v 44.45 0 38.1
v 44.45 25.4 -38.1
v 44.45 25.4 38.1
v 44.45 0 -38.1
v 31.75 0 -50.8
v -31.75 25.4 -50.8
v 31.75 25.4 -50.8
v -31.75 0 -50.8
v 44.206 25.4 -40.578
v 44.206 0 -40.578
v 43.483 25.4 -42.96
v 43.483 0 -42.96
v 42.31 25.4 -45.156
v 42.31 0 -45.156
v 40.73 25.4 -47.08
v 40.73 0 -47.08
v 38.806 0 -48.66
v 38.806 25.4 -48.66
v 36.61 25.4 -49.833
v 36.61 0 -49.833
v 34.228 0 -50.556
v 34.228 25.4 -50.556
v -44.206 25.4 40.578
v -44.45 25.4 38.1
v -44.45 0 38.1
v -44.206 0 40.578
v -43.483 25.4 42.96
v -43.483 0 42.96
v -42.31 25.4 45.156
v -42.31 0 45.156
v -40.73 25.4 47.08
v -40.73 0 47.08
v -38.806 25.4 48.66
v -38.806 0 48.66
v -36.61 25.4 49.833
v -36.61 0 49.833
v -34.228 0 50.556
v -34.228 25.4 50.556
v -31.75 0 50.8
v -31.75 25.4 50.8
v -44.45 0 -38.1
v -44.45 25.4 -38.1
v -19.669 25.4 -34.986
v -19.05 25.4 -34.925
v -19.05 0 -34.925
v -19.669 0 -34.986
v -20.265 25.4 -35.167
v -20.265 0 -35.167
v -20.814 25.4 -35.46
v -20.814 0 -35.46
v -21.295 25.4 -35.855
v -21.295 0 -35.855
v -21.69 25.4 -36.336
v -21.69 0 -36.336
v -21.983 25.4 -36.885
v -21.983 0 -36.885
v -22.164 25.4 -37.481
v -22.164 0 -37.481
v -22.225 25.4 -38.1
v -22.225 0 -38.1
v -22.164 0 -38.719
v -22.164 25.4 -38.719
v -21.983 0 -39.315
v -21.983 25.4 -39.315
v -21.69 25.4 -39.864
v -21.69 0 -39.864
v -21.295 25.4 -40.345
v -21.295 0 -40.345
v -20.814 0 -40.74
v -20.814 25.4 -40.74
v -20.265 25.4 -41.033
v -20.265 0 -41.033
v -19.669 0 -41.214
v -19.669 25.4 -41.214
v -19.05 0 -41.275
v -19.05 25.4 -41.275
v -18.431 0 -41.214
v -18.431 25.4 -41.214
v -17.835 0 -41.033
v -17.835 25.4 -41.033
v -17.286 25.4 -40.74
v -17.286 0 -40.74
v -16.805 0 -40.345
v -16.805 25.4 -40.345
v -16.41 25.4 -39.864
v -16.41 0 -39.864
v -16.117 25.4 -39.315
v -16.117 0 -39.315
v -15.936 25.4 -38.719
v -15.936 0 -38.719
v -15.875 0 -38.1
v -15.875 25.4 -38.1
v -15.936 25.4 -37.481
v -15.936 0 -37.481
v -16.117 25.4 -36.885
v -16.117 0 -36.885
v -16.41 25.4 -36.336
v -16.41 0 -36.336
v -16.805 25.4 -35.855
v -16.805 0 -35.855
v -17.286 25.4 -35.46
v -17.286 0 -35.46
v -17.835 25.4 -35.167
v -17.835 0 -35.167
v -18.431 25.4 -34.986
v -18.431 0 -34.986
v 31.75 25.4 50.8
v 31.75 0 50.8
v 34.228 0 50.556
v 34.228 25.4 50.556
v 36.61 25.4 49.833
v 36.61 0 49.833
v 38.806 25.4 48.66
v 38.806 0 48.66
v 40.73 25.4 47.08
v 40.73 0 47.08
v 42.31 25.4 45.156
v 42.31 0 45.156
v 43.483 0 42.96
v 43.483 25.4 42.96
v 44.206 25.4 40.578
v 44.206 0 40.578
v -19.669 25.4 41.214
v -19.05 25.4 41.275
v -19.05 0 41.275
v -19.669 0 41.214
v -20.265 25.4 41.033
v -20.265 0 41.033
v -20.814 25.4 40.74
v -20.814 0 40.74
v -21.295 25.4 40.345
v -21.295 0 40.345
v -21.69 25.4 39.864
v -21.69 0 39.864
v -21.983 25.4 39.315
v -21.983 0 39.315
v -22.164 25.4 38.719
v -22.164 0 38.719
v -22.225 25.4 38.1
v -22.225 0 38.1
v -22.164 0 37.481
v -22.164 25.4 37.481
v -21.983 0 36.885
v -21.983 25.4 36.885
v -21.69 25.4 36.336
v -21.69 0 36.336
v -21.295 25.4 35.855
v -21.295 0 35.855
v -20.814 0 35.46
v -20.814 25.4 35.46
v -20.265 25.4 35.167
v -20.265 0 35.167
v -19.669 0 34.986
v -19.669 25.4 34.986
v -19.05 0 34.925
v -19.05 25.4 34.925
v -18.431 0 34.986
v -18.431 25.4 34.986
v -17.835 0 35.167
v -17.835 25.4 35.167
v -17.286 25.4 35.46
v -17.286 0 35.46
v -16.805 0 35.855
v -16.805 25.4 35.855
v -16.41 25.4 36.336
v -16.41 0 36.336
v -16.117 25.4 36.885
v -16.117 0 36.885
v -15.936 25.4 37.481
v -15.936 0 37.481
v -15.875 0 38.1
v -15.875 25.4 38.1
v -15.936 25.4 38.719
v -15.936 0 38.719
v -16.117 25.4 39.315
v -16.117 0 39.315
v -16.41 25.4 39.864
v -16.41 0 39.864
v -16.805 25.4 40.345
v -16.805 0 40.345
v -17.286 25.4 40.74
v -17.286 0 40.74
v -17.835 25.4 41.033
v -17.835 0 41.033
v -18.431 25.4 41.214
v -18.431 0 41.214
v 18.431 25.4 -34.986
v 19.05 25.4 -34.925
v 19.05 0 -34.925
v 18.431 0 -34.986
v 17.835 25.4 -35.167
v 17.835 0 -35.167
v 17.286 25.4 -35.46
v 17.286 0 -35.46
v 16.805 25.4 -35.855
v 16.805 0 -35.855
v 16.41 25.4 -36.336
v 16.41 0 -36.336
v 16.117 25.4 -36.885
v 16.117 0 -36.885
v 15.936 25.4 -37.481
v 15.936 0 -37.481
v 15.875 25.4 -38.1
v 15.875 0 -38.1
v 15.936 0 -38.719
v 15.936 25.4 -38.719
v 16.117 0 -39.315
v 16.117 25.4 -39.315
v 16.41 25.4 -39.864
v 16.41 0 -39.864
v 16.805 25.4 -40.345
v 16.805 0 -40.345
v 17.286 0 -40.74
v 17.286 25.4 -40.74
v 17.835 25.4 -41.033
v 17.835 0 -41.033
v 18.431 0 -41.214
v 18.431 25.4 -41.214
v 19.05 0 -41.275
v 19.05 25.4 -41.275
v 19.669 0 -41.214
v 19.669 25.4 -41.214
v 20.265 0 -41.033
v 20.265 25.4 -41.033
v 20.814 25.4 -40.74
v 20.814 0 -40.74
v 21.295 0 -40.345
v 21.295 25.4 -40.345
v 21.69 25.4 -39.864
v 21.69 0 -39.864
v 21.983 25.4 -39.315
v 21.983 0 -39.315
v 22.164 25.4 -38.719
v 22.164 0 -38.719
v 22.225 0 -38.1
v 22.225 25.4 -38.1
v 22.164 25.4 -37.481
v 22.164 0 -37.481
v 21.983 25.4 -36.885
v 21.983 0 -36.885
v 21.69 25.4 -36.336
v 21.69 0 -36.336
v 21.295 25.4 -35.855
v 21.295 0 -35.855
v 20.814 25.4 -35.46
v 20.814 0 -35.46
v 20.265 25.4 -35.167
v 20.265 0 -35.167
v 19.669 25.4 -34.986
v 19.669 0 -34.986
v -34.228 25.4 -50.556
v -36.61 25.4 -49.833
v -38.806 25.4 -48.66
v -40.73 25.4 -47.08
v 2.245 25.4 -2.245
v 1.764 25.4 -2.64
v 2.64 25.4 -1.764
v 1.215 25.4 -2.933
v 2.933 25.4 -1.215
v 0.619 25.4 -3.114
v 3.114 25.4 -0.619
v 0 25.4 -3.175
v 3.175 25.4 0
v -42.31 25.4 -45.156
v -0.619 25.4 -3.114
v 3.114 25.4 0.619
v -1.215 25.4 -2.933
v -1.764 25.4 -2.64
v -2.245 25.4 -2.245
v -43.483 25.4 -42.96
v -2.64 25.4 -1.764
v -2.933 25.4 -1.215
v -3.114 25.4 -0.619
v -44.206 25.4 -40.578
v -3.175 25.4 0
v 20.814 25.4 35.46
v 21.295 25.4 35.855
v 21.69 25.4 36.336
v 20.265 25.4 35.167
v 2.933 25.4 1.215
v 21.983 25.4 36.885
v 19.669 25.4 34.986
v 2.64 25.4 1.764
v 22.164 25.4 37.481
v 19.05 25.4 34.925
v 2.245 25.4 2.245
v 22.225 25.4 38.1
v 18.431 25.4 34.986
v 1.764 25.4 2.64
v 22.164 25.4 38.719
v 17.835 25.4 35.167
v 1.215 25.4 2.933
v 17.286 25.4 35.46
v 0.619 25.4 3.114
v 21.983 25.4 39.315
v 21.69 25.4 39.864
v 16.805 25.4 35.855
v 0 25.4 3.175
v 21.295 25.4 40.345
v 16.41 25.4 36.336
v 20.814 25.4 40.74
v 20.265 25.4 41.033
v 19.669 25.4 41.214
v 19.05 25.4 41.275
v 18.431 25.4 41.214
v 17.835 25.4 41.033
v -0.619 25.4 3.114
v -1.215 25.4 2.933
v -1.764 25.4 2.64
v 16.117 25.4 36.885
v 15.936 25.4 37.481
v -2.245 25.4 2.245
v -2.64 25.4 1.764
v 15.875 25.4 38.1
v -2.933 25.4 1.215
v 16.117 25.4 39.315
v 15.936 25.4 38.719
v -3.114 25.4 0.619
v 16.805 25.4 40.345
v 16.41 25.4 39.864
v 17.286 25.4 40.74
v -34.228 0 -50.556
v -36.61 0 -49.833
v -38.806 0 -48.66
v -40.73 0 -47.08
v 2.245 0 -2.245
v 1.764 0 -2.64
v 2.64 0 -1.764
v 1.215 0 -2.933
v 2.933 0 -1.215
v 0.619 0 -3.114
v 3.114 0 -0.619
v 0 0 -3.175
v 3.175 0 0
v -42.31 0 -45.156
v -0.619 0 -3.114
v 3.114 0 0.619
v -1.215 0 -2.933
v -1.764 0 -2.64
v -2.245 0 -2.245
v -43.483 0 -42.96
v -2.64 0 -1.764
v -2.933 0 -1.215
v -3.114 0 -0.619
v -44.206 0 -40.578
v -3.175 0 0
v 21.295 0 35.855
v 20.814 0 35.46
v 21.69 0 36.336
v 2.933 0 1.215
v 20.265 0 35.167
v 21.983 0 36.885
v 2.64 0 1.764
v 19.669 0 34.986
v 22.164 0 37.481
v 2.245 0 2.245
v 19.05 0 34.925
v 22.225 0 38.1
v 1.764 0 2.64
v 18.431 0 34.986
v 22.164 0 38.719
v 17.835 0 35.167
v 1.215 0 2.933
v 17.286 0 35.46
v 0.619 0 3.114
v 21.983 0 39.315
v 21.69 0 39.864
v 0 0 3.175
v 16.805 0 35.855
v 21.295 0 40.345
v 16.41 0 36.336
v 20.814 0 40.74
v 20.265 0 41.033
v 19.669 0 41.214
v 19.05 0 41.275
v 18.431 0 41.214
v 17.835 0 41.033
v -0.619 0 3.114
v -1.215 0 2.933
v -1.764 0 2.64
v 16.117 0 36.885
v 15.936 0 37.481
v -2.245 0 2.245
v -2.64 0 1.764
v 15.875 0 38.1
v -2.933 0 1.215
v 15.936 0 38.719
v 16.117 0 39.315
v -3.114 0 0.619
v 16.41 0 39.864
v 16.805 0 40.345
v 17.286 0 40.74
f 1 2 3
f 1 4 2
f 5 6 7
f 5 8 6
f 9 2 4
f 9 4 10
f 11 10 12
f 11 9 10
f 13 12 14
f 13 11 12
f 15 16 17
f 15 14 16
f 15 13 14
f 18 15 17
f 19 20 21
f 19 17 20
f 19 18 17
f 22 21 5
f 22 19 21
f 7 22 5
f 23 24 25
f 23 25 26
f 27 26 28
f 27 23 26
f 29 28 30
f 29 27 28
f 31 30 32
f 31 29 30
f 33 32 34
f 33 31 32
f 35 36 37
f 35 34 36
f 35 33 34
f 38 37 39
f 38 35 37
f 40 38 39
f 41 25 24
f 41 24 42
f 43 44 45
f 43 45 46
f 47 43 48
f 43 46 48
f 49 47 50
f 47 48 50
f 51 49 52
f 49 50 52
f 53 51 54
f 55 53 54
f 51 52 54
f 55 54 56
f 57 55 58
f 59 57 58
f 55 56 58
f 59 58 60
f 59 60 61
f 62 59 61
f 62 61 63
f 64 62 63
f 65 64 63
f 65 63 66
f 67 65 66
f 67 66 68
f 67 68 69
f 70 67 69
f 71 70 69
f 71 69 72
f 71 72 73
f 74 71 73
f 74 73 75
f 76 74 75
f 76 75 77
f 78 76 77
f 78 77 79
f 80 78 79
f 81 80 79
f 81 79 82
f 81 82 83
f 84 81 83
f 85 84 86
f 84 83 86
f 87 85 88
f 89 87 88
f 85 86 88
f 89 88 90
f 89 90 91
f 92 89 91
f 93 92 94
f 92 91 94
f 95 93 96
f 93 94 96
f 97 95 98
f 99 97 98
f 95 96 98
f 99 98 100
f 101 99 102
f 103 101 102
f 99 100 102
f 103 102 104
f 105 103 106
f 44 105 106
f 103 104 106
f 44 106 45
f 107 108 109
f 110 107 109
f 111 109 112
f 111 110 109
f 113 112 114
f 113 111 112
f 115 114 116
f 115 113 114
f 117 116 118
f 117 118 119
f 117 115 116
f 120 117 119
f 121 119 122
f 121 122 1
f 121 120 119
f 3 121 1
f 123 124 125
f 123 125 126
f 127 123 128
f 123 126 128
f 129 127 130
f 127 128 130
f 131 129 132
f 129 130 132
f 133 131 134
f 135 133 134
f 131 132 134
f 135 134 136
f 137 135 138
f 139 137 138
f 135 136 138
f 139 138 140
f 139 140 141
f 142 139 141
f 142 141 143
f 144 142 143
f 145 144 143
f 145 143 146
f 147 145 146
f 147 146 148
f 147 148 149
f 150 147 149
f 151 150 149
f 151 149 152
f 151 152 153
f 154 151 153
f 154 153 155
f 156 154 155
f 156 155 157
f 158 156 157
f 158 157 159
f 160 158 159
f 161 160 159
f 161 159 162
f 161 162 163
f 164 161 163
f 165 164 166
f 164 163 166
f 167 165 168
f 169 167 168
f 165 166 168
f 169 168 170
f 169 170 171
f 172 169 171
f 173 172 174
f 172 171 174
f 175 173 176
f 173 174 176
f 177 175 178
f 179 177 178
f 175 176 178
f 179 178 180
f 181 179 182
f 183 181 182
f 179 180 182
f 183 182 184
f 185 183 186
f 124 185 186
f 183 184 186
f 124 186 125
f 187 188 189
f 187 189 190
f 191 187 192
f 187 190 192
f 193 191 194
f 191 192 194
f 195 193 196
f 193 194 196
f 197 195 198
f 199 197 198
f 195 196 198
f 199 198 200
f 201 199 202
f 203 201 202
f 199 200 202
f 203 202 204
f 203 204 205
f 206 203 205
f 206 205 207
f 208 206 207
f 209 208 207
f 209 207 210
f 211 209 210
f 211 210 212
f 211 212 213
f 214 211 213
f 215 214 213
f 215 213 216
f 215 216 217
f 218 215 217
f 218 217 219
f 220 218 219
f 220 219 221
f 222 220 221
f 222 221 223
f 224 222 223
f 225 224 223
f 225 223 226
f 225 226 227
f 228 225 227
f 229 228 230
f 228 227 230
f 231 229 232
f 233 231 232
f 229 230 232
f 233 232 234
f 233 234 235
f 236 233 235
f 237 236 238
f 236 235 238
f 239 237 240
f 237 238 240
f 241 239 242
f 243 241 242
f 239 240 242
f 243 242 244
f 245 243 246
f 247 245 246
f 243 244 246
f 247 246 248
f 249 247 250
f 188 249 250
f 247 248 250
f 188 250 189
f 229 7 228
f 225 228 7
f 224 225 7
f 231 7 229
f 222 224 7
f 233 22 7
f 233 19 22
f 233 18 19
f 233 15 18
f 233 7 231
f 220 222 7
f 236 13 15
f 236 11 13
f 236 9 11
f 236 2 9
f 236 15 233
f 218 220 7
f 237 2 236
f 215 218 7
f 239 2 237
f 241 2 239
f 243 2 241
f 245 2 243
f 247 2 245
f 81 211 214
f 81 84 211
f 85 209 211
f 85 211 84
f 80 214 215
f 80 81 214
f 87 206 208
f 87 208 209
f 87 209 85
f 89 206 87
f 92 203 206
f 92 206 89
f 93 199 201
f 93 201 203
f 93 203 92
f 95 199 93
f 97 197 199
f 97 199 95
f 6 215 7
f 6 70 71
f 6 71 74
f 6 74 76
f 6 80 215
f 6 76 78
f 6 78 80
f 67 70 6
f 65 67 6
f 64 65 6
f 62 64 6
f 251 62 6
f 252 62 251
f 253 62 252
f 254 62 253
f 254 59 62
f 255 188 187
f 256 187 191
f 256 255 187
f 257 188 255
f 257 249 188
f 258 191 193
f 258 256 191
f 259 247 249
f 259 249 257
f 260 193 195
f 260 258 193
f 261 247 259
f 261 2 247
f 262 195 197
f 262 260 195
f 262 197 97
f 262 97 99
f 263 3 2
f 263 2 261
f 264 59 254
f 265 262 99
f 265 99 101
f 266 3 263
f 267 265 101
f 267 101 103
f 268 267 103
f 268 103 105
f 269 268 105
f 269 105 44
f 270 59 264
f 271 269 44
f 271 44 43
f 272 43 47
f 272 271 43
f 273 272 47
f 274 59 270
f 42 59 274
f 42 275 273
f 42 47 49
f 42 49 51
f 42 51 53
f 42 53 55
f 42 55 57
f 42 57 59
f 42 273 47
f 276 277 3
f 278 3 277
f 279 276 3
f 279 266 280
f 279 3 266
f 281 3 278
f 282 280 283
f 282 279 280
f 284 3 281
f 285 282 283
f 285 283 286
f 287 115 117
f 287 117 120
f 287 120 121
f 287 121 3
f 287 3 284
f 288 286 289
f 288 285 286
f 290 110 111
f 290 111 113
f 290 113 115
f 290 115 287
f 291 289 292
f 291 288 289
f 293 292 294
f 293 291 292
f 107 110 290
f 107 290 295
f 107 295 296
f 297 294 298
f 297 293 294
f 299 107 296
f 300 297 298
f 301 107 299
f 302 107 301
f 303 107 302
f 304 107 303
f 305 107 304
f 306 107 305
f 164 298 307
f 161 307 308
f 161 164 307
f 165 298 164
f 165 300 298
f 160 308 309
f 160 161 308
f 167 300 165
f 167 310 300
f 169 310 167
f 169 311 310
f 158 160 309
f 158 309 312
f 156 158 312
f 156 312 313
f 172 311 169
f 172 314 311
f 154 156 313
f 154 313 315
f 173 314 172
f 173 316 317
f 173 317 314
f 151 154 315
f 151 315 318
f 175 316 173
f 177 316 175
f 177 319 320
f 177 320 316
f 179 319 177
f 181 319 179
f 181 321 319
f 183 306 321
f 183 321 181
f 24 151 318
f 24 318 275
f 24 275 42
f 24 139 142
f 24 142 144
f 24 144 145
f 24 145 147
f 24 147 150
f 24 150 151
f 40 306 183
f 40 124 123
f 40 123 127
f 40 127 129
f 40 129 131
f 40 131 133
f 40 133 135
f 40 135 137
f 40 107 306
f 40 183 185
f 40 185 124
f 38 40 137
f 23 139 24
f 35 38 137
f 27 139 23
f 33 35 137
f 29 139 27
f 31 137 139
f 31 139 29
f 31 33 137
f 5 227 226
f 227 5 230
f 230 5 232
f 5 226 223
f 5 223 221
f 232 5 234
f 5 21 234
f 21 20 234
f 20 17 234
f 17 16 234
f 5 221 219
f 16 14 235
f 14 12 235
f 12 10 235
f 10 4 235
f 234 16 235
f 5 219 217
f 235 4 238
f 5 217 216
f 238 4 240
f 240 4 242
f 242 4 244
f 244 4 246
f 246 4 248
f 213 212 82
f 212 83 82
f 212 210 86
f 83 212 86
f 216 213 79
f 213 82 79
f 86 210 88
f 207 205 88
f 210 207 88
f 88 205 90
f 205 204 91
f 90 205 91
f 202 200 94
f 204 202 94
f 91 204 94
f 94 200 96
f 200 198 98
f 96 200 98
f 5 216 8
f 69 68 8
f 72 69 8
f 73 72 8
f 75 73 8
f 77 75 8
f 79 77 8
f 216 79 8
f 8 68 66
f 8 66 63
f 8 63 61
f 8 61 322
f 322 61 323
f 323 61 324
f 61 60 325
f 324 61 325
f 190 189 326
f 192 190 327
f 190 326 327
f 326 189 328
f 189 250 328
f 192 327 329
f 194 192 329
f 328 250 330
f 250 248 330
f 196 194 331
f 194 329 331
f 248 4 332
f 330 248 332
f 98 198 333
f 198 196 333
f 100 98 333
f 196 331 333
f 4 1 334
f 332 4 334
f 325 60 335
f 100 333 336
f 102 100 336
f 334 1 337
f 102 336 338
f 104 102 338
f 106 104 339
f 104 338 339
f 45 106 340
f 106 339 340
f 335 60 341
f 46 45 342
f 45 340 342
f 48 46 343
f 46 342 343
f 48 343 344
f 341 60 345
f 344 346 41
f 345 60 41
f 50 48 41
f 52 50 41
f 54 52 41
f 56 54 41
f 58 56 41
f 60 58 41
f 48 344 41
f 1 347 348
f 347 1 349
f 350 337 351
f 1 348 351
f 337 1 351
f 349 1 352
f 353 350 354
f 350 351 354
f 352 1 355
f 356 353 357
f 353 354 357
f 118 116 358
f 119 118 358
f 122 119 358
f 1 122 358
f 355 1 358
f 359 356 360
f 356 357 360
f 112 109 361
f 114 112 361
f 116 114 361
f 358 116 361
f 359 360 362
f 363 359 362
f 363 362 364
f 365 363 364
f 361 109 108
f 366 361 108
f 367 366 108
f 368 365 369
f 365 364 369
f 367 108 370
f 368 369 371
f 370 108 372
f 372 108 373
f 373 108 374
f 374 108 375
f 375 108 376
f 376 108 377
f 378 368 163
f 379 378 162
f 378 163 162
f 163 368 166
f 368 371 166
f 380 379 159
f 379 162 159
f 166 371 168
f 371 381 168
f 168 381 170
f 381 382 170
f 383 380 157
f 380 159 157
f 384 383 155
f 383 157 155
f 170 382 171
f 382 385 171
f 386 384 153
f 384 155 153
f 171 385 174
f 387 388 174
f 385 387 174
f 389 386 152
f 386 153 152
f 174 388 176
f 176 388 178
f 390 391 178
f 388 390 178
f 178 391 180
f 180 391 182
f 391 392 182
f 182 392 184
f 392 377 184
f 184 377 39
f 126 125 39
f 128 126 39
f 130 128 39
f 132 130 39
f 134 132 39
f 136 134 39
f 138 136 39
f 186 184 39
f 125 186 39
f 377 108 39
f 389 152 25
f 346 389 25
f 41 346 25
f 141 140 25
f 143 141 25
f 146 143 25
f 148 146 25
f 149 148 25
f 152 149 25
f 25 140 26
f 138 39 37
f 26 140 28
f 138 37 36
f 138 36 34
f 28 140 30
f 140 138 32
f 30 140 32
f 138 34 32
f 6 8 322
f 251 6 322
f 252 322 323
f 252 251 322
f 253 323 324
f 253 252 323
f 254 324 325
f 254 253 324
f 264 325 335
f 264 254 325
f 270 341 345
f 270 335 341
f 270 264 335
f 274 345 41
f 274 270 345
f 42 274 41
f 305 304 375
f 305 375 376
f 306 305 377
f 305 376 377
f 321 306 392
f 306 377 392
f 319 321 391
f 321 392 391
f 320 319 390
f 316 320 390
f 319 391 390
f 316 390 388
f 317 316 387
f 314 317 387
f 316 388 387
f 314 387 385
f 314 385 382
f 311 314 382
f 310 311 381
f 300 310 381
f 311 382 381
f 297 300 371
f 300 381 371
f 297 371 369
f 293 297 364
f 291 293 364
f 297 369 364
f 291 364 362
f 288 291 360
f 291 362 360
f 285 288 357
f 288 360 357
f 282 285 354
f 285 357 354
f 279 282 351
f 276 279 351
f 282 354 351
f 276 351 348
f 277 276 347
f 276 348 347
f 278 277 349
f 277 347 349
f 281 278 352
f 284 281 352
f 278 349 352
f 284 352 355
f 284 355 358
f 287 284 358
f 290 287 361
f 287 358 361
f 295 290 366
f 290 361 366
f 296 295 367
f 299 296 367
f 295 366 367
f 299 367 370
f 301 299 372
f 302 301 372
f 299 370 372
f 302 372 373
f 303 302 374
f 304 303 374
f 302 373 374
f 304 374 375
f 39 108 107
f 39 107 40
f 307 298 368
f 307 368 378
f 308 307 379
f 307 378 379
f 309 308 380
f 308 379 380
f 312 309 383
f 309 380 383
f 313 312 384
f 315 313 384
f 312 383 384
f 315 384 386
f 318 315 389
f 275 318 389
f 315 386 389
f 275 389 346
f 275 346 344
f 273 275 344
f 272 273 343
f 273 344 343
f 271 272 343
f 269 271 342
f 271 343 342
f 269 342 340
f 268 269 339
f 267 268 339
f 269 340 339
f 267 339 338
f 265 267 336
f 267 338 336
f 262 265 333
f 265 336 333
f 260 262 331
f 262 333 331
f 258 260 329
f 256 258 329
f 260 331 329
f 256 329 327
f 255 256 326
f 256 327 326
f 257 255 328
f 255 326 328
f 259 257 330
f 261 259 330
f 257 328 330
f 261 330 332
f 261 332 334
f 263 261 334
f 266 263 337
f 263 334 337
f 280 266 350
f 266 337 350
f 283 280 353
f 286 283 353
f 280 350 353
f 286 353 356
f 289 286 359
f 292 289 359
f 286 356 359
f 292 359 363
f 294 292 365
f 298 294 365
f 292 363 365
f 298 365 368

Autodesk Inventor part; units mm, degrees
ref_plane "YZ Plane" through (0, 0, 0) normal (1, 0, 0) x (0, 1, 0)
ref_plane "XZ Plane" through (0, 0, 0) normal (0, 1, 0) x (-1, 0, 0)
ref_plane "XY Plane" through (0, 0, 0) normal (0, 0, 1) x (1, 0, 0)
sketch "Sketch2" plane through (0, 0, 0) normal (0, 1, 0) x (-1, 0, 0)
  line L0 (-44.45, 50.8) -> (44.45, 50.8)
  line L1 (44.45, 50.8) -> (44.45, -50.8)
  line L2 (44.45, -50.8) -> (-44.45, -50.8)
  line L3 (-44.45, -50.8) -> (-44.45, 50.8)
  point P0 (0, 0)
  dimension "d0" = 44.45
  dimension "d1" = 44.45
  dimension "d2" = 50.8
  dimension "d3" = 50.8
extrude "Extrusion1" add sketch "Sketch2" along normal blind 25.4
fillet "Fillet1" radius 12.7 4 edges at (44.45, 12.7, 50.8) (-44.45, 12.7, 50.8) (44.45, 12.7, -50.8) (-44.45, 12.7, -50.8)
sketch "Sketch3" plane through (0, 25.4, 0) normal (0, 1, 0) x (1, 0, 0)
  line L0 (-44.45, -38.1) -> (-44.45, 38.1) projected
  line L1 (31.75, -50.8) -> (-31.75, -50.8) projected
  line L2 (44.45, 38.1) -> (44.45, -38.1) projected
  line L3 (-31.75, 50.8) -> (31.75, 50.8) projected
  point P0 (0, 0)
  point P1 (-19.05, 38.1)
  point P2 (19.05, 38.1)
  point P3 (19.05, -38.1)
  point P4 (-19.05, -38.1)
  point P5 (0, 0)
  dimension "d7" = 25.4
  dimension "d8" = 25.4
  dimension "d9" = 12.7
  dimension "d10" = 12.7
hole "Hole1" at (-19.05, 25.4, -38.1) at (19.05, 25.4, -38.1) at (19.05, 25.4, 38.1) at (-19.05, 25.4, 38.1) at (0, 25.4, 0) direction (0, -1, 0) diameter 6.35 end through all
equation "\"d1\" = d0"
equation "\"d3\" = d2"
equation "\"d8\" = d7"
properties part number "Fixed Extension" material "Aluminum-6061"
